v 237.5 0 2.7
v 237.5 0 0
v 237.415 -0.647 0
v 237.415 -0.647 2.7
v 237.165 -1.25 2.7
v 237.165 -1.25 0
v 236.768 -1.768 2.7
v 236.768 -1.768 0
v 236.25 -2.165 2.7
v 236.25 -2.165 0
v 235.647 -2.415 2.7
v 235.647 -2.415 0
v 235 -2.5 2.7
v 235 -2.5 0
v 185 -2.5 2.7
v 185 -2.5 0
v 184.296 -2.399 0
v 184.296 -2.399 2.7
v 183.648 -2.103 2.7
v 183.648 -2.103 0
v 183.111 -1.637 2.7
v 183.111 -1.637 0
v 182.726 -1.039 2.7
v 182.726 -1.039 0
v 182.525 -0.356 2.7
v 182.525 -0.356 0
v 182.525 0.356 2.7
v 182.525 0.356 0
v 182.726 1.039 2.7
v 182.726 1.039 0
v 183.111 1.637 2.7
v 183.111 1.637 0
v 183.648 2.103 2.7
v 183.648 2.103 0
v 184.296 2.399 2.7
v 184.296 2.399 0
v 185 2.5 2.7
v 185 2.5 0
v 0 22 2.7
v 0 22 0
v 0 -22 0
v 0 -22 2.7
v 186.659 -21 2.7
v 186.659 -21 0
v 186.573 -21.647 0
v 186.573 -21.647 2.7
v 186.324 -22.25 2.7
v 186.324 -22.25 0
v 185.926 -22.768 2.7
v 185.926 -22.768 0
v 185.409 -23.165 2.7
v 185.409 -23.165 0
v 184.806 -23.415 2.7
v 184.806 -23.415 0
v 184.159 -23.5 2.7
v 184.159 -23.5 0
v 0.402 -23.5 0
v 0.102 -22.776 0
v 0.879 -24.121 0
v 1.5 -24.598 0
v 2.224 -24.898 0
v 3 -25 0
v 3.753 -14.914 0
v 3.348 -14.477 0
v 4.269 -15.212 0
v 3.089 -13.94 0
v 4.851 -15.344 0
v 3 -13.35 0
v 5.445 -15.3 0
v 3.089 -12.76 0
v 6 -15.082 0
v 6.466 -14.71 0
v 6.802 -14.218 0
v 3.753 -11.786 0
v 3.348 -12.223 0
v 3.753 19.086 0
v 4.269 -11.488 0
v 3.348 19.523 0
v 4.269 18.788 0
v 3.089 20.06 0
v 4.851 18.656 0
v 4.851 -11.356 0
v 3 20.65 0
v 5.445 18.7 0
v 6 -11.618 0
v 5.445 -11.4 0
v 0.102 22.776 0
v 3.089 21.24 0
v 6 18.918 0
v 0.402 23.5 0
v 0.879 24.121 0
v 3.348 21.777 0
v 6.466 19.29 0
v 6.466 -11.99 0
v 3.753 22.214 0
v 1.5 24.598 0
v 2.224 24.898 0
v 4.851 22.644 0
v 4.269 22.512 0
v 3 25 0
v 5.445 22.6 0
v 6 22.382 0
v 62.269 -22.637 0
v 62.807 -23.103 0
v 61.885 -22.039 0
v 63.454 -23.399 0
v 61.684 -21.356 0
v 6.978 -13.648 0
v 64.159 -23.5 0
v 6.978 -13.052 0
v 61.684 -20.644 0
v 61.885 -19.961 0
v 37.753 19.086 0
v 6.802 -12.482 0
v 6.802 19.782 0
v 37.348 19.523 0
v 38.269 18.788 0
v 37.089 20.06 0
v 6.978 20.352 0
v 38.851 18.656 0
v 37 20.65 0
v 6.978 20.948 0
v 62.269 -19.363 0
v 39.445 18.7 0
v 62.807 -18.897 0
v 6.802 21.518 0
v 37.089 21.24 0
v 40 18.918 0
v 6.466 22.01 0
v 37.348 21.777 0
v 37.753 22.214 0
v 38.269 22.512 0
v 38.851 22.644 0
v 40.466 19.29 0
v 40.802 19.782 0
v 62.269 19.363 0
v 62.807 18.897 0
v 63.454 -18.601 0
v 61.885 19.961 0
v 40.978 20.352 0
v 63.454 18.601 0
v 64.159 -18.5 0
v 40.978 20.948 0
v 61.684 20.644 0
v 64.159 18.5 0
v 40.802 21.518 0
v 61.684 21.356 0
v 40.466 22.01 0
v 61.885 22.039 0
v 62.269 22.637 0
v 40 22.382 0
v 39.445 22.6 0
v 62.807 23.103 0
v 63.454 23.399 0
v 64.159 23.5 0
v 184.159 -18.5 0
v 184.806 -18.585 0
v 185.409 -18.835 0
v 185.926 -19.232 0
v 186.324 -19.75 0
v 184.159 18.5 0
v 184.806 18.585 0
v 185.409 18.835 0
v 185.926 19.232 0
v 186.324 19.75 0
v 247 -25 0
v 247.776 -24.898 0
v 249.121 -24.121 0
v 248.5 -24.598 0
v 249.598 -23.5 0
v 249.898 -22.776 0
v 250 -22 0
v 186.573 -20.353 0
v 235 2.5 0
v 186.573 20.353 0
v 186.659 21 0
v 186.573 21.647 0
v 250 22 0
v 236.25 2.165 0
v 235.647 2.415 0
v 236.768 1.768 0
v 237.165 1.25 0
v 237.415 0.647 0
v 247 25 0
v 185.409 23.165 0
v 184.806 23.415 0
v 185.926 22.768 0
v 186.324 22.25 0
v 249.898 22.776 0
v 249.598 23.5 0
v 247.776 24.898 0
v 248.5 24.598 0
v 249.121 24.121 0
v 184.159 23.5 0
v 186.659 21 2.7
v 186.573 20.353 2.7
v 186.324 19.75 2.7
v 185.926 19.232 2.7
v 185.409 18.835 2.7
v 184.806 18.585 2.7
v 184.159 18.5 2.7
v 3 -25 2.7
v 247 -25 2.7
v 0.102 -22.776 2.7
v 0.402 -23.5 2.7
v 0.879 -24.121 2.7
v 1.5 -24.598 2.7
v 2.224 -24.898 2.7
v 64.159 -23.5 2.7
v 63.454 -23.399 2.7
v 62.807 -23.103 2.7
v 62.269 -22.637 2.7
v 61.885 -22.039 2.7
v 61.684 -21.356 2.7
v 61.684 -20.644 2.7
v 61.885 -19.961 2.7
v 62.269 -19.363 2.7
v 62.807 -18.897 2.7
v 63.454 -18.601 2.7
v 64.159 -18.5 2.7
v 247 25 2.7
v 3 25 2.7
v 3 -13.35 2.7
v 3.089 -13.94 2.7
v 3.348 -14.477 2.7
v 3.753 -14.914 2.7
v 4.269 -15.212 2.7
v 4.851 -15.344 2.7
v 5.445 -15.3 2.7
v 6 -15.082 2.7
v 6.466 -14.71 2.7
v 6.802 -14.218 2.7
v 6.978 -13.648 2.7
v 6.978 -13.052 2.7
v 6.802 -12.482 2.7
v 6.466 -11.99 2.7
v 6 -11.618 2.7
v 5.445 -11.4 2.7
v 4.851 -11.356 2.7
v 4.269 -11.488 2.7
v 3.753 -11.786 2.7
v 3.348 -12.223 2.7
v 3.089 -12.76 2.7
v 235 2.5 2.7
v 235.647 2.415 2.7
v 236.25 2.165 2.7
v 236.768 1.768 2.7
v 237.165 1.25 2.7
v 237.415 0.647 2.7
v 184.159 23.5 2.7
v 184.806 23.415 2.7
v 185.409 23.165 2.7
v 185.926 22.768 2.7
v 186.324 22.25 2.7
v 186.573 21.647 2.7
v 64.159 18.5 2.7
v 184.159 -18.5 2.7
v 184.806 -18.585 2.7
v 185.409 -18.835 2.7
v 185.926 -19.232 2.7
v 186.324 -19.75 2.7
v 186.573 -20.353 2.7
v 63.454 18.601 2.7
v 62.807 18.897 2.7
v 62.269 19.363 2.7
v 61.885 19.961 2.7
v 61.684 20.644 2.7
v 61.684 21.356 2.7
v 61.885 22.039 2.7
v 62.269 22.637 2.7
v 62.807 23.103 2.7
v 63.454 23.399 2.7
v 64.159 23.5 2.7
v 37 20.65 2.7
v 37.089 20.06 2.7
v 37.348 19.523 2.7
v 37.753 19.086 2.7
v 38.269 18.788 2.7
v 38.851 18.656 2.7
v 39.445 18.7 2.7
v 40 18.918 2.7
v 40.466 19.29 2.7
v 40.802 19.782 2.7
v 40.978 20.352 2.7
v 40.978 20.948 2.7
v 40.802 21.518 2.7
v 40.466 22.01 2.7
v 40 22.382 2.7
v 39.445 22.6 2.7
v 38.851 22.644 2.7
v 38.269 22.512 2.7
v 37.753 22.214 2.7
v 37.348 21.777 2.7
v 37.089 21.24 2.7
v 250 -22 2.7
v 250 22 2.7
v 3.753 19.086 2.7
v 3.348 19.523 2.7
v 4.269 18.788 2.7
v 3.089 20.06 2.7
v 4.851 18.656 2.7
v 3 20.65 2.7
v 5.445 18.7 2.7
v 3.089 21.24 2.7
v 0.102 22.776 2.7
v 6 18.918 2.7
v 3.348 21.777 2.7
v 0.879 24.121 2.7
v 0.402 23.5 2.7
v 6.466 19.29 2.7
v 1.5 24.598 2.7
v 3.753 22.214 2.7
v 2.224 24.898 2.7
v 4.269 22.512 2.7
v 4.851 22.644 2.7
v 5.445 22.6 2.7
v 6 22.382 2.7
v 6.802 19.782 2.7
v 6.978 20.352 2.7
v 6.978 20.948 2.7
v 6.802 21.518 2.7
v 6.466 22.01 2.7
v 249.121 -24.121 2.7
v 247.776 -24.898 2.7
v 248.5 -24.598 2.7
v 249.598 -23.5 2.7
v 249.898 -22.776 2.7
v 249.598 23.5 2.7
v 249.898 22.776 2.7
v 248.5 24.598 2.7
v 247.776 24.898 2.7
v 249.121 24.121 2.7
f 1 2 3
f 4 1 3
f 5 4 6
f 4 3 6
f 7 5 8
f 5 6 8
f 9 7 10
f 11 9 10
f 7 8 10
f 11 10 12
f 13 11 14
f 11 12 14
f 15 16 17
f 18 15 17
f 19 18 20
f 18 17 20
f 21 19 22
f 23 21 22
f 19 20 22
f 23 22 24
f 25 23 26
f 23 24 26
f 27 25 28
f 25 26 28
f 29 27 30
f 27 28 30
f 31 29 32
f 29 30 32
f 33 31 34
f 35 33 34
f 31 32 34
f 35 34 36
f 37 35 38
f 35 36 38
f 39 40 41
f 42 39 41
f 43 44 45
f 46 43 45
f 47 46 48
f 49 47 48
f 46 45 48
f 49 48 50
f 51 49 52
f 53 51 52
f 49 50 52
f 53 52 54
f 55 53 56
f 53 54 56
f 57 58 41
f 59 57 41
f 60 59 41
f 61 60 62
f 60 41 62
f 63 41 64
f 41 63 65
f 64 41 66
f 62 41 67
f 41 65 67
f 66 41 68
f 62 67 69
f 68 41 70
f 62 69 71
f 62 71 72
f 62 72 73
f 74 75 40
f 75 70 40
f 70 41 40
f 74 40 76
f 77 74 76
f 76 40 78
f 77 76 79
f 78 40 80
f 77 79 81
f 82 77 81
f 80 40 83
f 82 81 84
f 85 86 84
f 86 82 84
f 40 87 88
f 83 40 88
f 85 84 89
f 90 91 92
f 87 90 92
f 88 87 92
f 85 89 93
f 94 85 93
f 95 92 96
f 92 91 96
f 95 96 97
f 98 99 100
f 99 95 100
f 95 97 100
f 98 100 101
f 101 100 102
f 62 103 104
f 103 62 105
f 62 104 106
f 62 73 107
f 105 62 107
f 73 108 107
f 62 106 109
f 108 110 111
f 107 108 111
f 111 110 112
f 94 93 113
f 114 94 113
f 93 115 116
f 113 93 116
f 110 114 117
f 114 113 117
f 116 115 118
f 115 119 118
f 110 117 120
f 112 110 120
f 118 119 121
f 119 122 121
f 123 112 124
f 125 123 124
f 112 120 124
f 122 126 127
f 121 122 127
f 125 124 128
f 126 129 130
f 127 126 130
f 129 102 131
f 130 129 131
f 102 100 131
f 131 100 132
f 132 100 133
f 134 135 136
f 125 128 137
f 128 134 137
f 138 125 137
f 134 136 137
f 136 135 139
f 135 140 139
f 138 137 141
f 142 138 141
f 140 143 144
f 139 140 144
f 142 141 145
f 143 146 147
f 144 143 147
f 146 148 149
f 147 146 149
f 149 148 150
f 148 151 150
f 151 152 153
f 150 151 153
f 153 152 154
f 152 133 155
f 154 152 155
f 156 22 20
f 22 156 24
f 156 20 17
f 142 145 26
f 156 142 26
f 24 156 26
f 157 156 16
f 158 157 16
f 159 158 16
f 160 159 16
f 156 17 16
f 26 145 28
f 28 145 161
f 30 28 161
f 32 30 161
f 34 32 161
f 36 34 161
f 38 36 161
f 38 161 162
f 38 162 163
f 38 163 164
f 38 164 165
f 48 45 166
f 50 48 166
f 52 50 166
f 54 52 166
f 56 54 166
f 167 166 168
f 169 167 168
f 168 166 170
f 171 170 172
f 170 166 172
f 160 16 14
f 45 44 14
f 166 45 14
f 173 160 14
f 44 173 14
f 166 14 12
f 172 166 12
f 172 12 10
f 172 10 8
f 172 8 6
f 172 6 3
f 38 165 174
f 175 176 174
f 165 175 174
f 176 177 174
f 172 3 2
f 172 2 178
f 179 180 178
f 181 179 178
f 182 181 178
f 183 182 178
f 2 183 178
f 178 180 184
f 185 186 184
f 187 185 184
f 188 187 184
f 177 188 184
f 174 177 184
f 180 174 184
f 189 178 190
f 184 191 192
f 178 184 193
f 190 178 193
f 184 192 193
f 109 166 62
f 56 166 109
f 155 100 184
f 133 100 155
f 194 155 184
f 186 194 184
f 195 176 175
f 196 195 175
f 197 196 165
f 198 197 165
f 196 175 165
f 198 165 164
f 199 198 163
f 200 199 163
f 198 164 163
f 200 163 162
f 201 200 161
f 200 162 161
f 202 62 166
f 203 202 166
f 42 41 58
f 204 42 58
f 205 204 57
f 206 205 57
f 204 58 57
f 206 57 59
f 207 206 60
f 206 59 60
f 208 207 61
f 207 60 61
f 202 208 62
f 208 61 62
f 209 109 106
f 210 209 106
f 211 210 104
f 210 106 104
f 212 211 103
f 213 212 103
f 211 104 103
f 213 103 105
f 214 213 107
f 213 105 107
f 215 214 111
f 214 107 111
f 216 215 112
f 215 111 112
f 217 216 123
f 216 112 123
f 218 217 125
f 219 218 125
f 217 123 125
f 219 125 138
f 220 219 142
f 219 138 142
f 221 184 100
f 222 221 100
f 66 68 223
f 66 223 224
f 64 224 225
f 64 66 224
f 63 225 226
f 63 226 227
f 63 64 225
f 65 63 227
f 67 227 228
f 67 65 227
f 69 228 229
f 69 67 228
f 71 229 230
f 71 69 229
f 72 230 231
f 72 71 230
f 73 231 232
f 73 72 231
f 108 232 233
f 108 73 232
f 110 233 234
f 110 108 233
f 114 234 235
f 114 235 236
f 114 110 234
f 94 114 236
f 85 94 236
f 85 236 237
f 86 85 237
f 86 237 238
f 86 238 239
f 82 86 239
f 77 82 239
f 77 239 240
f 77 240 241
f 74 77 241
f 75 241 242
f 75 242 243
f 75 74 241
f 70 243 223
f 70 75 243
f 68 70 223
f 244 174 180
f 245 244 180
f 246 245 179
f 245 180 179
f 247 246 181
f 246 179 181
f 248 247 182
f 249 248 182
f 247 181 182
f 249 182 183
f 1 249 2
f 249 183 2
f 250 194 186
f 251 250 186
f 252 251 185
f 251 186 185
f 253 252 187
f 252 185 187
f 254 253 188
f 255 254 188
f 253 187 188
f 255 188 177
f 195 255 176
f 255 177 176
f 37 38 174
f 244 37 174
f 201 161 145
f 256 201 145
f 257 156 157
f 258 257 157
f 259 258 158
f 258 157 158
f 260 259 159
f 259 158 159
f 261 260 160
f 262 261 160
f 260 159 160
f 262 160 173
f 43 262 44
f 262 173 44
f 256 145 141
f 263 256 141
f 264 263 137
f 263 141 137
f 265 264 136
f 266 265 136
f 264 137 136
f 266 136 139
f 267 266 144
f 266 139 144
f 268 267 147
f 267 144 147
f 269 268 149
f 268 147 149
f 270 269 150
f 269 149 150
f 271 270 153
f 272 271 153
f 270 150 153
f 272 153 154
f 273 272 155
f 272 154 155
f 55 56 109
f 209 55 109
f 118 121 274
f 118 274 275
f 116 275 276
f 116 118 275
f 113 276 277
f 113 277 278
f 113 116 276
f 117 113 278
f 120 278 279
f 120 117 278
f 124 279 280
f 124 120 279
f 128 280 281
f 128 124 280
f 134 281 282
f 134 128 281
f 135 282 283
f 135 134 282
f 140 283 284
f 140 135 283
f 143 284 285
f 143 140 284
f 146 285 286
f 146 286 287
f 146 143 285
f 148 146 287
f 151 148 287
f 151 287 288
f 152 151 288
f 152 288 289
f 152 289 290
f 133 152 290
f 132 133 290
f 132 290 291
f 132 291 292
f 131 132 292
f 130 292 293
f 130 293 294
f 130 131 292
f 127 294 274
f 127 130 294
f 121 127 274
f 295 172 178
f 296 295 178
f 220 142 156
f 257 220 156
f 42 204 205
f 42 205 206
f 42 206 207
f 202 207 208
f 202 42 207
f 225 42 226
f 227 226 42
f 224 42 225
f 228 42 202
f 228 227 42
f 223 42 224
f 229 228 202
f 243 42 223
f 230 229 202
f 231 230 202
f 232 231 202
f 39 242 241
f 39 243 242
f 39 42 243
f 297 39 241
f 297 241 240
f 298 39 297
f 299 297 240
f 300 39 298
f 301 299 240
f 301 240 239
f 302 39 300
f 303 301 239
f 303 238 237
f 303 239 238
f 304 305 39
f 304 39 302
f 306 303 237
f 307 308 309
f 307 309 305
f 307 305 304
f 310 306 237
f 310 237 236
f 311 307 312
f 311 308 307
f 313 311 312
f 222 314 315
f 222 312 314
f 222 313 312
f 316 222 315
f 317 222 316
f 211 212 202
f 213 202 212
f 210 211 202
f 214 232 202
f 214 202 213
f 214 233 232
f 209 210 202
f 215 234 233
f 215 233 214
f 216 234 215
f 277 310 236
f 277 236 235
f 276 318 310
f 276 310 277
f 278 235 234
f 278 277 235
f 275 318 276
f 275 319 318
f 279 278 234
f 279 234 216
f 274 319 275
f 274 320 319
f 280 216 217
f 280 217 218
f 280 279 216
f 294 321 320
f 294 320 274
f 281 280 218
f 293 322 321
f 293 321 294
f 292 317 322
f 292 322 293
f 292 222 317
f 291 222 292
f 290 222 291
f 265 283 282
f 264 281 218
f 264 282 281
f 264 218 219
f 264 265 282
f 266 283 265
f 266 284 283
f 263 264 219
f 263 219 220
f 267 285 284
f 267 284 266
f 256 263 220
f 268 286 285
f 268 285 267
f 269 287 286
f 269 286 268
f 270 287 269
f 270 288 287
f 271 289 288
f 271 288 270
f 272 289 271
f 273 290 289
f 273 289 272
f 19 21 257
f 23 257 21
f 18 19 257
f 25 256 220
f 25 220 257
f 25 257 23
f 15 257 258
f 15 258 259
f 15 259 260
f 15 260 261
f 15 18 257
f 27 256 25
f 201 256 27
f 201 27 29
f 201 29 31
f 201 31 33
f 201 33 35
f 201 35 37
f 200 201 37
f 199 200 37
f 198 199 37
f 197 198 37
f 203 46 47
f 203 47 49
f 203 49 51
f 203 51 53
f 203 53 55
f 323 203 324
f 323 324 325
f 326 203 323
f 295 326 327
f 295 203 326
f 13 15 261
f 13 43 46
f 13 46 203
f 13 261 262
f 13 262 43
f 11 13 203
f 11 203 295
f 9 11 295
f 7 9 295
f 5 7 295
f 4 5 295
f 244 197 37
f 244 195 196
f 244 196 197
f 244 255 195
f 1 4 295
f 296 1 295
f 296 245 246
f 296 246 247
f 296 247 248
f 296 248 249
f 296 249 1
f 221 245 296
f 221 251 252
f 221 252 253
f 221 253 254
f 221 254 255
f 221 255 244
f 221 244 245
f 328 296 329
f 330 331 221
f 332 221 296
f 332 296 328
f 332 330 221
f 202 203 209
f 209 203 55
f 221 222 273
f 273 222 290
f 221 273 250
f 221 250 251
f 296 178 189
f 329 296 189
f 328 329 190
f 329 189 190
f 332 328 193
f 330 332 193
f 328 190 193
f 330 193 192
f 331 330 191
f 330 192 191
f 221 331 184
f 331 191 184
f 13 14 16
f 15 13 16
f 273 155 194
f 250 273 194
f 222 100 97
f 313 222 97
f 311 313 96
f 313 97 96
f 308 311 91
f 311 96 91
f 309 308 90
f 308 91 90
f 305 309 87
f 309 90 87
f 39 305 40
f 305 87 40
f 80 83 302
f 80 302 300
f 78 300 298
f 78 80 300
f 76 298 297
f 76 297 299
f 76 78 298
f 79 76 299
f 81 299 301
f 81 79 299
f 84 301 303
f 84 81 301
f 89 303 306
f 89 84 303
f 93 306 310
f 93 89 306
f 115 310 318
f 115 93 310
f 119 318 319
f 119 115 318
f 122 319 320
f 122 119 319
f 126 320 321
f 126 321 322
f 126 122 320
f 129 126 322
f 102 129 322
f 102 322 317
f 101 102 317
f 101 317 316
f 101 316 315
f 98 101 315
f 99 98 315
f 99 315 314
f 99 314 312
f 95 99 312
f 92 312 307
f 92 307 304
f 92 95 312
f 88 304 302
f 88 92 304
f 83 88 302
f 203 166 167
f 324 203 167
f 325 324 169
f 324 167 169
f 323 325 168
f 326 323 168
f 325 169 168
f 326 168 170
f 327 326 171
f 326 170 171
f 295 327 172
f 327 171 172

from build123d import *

# Parameters (mm, degrees)
SKETCH_1_R      = 2
EXTRUDE_1_DEPTH = 2.7


with BuildPart() as part:
    # 草图1 → 凸台-拉伸1 (new body)
    with BuildSketch(Plane.XY):
        with BuildLine():
            ThreePointArc((3, 25), (0.878679656, 24.121320344), (0, 22))
            Line((0, 22), (0, -22))
            ThreePointArc((0, -22), (0.878679656, -24.121320344), (3, -25))
            Line((3, -25), (247, -25))
            ThreePointArc((247, -25), (249.121320344, -24.121320344), (250, -22))
            Line((250, -22), (250, 22))
            ThreePointArc((250, 22), (249.121320344, 24.121320344), (247, 25))
            Line((247, 25), (3, 25))
        make_face()
        with Locations(Location((5, -13.35, 0), (0, 0, 180))):
            Circle(SKETCH_1_R, mode=Mode.SUBTRACT)
        with BuildLine():
            Line((184.15863574, -23.5), (64.15863574, -23.5))
            ThreePointArc((64.15863574, -23.5), (61.65863574, -21), (64.15863574, -18.5))
            Line((64.15863574, -18.5), (184.15863574, -18.5))
            ThreePointArc((184.15863574, -18.5), (185.926402692, -19.232233047), (186.65863574, -21))
            ThreePointArc((186.65863574, -21), (185.926402692, -22.767766953), (184.15863574, -23.5))
        make_face(mode=Mode.SUBTRACT)
        with BuildLine():
            ThreePointArc((185, -2.5), (182.5, 0), (185, 2.5))
            Line((185, 2.5), (235, 2.5))
            ThreePointArc((235, 2.5), (236.767766953, 1.767766953), (237.5, 0))
            ThreePointArc((237.5, 0), (236.767766953, -1.767766953), (235, -2.5))
            Line((235, -2.5), (185, -2.5))
        make_face(mode=Mode.SUBTRACT)
        with Locations(Location((5, 20.65, 0), (0, 0, 180))):
            Circle(SKETCH_1_R, mode=Mode.SUBTRACT)
        with Locations(Location((39, 20.65, 0), (0, 0, 180))):
            Circle(SKETCH_1_R, mode=Mode.SUBTRACT)
        with BuildLine():
            Line((184.15863574, 18.5), (64.15863574, 18.5))
            ThreePointArc((64.15863574, 18.5), (61.65863574, 21), (64.15863574, 23.5))
            Line((64.15863574, 23.5), (184.15863574, 23.5))
            ThreePointArc((184.15863574, 23.5), (185.926402692, 22.767766953), (186.65863574, 21))
            ThreePointArc((186.65863574, 21), (185.926402692, 19.232233047), (184.15863574, 18.5))
        make_face(mode=Mode.SUBTRACT)
    extrude(amount=EXTRUDE_1_DEPTH)


solid = part.part
